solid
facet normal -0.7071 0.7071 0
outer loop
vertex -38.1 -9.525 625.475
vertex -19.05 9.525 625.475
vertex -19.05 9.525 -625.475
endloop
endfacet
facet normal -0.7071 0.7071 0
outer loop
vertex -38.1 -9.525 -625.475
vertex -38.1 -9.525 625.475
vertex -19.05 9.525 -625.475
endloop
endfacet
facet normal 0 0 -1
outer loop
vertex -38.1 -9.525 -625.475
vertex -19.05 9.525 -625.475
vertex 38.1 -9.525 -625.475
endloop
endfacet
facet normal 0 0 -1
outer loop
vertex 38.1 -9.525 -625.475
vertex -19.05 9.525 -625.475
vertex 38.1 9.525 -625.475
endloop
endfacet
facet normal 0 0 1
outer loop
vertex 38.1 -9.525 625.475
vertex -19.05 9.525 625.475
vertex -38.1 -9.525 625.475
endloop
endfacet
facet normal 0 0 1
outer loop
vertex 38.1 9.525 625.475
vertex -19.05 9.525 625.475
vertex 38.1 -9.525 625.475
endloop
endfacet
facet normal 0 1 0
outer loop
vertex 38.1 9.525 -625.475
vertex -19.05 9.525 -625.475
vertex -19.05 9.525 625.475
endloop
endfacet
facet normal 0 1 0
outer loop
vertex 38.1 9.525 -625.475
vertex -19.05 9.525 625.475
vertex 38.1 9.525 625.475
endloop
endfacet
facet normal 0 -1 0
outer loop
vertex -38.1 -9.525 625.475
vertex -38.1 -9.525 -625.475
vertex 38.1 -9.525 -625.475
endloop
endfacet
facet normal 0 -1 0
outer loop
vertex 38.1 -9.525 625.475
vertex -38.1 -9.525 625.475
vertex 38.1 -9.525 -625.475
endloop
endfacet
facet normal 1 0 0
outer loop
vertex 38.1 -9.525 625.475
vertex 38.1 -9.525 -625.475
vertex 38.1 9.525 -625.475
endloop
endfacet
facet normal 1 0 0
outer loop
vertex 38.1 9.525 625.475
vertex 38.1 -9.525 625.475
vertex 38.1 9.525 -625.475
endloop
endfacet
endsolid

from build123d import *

# Parameters (mm, degrees)
F0_W     = 76.2
F0_H     = 19.05
F1_DEPTH = 625.475
F2_SIZE2 = 19.04999
F2_SIZE  = 19.04999


# Not quite as in the source:
# - a fillet or chamfer is up to 0.001 mm smaller than in the source, because OpenCascade refuses the exact size


with BuildPart() as f1:
    # F0 (on Top) → F1 (new body, symmetric)
    with BuildSketch(Plane.XY):
        Rectangle(F0_W, F0_H)
    extrude(amount=F1_DEPTH, both=True)

    # F2 (size 19.05 and 19.05 in the source; OpenCascade refuses exactly that, so slightly less here)
    f2_edges = [f1.edges().sort_by_distance(p)[0] for p in [
        (-38.1, 9.525, 0),
    ]]
    chamfer(f2_edges, length=F2_SIZE, length2=F2_SIZE2)


solid = f1.part
